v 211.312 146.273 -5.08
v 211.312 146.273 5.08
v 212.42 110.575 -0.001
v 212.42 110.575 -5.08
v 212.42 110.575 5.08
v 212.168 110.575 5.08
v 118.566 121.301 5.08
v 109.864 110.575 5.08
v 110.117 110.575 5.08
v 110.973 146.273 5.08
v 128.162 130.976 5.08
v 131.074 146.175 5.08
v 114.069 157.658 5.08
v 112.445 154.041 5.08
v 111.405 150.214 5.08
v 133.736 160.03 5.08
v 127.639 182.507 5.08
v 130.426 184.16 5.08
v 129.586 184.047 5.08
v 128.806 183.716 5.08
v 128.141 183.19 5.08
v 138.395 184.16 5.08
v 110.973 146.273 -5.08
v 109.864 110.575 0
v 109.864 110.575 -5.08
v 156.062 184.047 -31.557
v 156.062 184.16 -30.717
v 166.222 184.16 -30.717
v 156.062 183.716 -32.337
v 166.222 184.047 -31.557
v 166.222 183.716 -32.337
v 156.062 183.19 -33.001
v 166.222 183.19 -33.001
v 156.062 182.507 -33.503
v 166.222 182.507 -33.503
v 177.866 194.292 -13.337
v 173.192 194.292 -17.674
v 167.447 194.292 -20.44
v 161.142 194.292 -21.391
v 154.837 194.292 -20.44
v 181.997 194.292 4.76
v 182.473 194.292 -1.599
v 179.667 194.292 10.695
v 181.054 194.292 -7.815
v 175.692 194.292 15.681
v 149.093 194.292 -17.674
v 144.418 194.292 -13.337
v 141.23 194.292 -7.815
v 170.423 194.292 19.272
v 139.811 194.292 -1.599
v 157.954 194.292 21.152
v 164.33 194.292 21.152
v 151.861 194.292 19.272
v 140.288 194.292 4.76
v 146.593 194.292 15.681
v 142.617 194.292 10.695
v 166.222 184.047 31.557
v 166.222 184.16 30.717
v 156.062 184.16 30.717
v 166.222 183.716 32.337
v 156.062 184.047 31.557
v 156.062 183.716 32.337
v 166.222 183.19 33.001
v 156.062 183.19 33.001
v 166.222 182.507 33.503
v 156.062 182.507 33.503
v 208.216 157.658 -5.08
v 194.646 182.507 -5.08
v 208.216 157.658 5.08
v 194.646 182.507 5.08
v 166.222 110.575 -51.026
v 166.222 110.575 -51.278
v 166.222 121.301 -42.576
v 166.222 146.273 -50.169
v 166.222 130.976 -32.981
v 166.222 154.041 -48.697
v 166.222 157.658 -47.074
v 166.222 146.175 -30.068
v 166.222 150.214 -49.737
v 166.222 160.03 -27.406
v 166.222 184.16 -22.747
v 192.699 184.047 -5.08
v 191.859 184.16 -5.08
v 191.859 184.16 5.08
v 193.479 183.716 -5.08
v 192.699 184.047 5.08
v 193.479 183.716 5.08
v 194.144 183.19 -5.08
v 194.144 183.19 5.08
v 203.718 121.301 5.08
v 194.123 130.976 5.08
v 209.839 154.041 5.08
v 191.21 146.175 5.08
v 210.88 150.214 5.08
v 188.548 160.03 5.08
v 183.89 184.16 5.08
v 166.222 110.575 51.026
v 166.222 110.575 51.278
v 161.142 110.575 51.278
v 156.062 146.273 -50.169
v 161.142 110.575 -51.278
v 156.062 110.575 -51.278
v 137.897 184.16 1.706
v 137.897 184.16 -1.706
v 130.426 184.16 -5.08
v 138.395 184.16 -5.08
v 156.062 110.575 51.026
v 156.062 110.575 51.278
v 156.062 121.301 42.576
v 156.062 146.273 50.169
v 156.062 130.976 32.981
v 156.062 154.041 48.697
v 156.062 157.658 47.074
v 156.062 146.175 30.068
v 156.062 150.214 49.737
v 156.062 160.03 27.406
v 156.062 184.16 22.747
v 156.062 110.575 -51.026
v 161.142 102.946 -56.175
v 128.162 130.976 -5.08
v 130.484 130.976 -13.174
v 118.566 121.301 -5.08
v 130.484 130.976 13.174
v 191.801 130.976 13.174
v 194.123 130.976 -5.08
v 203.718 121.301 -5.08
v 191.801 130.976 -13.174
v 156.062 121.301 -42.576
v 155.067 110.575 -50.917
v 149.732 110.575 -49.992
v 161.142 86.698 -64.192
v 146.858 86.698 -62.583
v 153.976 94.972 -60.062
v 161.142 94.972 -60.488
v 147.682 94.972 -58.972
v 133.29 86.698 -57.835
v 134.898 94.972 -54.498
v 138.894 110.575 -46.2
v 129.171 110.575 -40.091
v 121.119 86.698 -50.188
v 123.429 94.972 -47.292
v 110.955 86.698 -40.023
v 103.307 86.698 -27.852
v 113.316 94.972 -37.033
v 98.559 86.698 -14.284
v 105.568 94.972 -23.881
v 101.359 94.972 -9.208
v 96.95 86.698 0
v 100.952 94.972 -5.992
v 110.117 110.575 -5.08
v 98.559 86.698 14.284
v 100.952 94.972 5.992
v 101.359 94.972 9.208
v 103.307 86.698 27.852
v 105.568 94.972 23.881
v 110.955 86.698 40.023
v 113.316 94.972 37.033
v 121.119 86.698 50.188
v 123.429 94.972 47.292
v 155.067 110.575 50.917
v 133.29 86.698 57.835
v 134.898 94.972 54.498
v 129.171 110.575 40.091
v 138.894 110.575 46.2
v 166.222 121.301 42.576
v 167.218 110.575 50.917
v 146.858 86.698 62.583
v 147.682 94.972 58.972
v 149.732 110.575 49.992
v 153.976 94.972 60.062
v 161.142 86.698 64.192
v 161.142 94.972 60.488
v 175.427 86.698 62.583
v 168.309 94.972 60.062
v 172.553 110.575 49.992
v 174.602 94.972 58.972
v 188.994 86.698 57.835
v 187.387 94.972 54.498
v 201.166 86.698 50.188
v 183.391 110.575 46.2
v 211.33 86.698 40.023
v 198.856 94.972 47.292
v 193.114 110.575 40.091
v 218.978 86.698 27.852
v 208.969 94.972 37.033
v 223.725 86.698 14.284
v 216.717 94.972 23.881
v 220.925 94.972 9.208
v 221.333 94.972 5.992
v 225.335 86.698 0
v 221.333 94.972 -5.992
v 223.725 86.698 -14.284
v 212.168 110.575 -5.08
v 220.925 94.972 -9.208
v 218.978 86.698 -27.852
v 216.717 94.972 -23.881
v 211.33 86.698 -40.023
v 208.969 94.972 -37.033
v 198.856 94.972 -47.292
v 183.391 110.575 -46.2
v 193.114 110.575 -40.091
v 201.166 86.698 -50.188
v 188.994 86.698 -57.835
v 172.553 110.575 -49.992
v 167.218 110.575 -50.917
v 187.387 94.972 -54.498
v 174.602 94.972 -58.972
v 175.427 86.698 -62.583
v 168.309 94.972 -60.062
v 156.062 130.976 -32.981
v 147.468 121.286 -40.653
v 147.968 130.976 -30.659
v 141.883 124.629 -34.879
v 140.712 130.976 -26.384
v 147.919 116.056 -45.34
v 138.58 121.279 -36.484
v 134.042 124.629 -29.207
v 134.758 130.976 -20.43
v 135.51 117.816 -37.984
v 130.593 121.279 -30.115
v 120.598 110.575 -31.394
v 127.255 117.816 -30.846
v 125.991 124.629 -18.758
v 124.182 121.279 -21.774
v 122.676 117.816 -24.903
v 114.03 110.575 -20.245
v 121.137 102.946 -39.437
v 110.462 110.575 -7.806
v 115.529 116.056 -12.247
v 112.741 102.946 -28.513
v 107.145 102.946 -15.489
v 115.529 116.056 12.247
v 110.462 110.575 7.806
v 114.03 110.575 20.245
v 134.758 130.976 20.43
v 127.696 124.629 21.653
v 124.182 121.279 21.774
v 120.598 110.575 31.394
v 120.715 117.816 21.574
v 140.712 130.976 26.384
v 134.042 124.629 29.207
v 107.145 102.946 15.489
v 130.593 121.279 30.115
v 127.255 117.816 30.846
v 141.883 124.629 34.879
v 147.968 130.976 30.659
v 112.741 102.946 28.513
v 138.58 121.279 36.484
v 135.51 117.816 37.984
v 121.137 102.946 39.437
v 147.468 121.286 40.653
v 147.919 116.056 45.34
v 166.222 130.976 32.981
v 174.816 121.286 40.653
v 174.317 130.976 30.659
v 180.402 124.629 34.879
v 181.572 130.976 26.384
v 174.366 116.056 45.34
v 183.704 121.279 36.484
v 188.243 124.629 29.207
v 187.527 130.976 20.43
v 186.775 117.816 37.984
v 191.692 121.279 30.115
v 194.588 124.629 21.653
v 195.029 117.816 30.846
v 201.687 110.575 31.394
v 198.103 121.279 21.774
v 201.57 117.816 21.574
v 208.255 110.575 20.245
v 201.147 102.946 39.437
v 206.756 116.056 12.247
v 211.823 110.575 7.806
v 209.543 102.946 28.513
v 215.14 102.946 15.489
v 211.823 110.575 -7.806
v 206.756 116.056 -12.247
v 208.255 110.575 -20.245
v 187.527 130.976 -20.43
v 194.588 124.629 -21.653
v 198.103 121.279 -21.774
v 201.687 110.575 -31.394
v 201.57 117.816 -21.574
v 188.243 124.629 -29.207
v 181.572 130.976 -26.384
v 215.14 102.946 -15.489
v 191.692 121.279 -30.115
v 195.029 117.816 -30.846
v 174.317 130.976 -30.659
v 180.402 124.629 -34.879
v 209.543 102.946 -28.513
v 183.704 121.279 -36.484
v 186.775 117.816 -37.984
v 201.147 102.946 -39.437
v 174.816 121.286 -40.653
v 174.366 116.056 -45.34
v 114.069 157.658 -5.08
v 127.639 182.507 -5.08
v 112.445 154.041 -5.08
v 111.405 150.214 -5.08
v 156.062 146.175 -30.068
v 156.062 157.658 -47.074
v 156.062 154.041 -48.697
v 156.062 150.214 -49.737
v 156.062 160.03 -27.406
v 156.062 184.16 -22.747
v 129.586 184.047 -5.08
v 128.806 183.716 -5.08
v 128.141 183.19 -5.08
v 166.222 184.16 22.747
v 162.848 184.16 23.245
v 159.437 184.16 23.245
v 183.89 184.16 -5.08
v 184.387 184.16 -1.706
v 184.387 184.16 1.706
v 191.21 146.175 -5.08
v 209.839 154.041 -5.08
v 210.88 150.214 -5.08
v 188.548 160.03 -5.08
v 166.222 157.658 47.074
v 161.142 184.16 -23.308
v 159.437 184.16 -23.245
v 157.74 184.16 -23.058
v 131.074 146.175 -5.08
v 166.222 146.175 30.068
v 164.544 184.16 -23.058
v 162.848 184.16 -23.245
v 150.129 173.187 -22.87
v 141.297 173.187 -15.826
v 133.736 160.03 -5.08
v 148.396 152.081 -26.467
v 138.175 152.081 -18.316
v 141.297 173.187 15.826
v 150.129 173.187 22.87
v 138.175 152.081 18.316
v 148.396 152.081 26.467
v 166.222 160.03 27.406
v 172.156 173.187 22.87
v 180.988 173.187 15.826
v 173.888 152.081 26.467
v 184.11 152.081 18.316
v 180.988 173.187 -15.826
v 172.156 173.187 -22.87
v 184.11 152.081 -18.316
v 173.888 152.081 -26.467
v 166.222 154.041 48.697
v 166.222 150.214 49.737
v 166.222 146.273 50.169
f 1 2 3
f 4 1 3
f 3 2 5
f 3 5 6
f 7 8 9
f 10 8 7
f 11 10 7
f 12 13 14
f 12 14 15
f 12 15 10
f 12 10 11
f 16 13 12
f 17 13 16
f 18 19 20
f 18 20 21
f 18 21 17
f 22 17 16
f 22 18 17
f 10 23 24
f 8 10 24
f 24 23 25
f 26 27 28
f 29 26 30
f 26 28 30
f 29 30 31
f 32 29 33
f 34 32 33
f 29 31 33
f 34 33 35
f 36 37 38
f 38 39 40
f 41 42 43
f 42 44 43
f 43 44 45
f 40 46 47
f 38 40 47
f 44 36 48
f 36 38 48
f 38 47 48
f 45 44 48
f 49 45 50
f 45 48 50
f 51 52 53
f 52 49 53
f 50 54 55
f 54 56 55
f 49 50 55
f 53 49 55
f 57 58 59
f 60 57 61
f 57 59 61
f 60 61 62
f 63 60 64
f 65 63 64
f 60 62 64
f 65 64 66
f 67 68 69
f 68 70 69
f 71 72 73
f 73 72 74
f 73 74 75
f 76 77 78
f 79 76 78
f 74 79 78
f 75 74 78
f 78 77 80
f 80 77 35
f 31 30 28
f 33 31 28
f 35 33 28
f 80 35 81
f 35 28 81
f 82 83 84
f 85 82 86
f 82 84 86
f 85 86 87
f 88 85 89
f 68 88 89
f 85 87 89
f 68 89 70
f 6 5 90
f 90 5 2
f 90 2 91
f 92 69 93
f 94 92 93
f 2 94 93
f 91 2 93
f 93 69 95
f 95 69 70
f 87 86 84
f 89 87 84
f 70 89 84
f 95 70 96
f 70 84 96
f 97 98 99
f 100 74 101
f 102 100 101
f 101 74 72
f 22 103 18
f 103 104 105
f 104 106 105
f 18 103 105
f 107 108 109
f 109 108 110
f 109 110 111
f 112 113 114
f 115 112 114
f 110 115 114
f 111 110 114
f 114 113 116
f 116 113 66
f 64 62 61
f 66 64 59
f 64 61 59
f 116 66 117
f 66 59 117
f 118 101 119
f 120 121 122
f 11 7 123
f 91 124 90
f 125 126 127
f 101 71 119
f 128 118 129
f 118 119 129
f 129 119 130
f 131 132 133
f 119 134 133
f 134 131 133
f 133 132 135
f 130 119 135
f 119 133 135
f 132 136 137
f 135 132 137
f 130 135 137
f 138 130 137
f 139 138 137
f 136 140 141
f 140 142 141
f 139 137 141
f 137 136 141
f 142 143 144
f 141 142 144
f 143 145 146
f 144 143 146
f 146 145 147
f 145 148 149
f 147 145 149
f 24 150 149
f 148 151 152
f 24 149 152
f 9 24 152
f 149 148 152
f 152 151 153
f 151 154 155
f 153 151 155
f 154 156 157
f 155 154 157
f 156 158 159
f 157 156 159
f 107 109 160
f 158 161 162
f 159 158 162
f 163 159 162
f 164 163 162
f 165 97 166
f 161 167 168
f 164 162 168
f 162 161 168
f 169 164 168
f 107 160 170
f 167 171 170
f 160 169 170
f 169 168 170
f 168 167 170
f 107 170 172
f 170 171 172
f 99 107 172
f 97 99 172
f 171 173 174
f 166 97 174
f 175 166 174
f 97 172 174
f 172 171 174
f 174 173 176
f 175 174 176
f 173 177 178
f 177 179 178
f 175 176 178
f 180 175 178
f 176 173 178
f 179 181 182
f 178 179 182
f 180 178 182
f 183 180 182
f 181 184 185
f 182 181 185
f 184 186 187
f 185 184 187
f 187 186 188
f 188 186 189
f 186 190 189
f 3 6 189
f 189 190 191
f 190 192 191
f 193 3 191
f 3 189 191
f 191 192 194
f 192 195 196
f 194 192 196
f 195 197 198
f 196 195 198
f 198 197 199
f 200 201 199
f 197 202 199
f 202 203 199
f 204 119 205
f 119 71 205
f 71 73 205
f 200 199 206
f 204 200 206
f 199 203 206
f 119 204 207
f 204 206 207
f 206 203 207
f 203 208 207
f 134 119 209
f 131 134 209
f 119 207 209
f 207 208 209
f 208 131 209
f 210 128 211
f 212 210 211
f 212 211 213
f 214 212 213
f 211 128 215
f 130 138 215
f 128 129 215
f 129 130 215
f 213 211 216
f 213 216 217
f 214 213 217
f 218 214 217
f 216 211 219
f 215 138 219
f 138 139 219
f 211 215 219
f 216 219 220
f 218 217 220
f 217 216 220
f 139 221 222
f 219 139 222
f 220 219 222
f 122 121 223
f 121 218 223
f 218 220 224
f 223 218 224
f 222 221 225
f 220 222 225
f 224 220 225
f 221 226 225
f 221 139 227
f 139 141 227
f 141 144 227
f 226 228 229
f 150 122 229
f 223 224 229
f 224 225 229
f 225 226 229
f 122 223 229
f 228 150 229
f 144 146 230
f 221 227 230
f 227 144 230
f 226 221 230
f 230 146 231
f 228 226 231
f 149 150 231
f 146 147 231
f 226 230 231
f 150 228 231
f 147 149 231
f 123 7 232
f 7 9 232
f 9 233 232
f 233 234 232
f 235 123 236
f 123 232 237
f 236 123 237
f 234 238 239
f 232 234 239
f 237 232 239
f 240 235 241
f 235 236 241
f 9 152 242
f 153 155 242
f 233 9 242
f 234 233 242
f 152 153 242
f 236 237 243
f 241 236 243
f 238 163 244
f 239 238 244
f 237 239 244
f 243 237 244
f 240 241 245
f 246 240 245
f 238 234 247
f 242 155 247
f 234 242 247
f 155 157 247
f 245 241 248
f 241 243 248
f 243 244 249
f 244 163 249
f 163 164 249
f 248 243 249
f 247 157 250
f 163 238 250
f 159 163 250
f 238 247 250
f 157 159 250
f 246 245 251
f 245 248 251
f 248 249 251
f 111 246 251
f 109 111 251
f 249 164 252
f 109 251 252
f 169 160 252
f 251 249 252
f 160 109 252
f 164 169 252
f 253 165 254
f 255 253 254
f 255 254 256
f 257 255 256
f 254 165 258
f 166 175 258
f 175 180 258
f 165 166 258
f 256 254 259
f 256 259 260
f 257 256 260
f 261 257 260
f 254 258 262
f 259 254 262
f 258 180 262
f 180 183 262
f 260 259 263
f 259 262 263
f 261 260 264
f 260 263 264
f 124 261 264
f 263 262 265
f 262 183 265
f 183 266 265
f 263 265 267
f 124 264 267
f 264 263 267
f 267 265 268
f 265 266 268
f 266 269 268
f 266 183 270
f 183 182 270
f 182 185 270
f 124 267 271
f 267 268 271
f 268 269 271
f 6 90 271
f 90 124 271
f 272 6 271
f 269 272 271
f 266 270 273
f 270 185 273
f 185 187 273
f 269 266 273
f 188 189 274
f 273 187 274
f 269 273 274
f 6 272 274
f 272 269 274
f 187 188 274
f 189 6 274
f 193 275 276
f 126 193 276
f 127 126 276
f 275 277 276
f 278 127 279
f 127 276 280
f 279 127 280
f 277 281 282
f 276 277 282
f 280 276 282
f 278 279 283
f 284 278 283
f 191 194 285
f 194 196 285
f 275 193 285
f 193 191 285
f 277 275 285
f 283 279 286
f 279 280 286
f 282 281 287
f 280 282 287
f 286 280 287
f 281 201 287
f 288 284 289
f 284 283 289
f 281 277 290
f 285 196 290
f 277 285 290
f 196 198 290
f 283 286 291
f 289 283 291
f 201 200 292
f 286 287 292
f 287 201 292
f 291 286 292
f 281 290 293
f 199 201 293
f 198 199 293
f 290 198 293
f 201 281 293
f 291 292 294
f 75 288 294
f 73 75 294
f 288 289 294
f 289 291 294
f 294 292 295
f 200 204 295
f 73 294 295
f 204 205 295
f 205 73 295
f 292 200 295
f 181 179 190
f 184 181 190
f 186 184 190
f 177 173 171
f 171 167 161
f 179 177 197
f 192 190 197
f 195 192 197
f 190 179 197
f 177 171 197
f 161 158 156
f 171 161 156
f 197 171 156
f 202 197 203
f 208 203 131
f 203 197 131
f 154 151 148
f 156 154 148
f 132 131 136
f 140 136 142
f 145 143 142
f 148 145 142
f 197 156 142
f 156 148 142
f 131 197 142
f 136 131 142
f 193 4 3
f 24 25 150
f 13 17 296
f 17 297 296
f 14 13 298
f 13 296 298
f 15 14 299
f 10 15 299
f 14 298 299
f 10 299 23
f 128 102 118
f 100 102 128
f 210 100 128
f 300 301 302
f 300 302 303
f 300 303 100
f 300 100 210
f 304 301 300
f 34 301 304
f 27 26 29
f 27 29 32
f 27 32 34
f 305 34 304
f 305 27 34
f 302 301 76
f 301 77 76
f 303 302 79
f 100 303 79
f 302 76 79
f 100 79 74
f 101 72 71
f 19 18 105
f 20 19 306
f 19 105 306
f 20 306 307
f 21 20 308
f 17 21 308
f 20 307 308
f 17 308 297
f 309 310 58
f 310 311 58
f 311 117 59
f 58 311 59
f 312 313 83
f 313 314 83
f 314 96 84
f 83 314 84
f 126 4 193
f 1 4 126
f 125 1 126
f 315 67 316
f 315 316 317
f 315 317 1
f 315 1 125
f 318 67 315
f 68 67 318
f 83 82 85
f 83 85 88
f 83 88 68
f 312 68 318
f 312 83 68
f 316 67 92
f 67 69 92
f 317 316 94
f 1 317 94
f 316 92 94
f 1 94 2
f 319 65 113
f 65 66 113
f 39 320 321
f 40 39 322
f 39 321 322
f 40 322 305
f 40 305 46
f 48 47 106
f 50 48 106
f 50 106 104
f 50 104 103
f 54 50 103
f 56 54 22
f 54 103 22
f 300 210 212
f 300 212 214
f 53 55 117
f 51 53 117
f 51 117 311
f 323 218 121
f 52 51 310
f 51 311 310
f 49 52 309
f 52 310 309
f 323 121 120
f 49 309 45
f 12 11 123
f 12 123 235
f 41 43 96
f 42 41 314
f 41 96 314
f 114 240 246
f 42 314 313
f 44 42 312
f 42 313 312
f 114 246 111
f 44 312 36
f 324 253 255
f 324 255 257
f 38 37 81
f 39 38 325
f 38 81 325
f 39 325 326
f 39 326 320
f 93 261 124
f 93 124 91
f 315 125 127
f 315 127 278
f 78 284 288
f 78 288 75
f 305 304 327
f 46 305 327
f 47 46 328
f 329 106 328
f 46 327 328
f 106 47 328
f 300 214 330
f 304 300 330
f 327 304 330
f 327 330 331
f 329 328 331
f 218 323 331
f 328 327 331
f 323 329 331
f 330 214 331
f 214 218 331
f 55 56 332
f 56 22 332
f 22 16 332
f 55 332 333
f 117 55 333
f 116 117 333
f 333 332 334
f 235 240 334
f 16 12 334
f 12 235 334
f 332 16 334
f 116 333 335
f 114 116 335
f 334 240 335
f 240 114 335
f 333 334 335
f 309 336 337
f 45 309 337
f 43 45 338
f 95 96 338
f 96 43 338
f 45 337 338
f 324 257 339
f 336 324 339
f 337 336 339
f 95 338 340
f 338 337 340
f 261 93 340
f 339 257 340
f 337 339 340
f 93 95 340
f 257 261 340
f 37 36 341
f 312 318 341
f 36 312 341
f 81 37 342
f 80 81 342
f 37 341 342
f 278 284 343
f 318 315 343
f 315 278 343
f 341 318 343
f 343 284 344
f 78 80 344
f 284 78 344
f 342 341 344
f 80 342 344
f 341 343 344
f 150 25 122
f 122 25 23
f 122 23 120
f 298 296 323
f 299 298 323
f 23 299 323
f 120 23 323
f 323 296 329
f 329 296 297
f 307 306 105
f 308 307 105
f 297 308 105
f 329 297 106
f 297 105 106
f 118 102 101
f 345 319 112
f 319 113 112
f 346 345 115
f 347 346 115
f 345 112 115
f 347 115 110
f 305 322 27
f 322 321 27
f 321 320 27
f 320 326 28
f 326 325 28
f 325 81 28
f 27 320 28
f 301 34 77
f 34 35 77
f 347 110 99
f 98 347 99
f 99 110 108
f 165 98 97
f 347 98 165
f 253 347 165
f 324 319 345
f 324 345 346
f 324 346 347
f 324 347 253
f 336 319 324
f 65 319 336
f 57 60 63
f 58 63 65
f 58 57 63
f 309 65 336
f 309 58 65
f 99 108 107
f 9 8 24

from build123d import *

# Parameters (mm, degrees)
EXTRUDE7_DEPTH    = 5.08
CIRPATTERN1_COUNT = 4


with BuildPart() as part:
    # Sketch9 → Revolve3 (revolve)
    with BuildSketch(Plane.XY):
        with BuildLine():
            Line((182.533079755, 194.292434626), (161.142350377, 194.292434626))
            Line((161.142350377, 194.292434626), (161.142350377, 86.698034626))
            Line((161.142350377, 86.698034626), (225.334809451, 86.698034626))
            ThreePointArc((225.334809451, 86.698034626), (212.420274366, 110.575127951), (194.511888207, 130.975875666))
            Line((194.511888207, 130.975875666), (182.533079755, 194.292434626))
        make_face()
    revolve(axis=Axis((161.142350377, 86.698034626, 0), (0, 1, 0)))

    # Sketch10 → Extrude7 (add, symmetric)
    with BuildSketch(Plane.XY):
        with BuildLine():
            Line((161.142350377, 110.575127951), (161.142350377, 184.160379168))
            Line((161.142350377, 184.160379168), (191.859109399, 184.160379168))
            ThreePointArc((191.859109399, 184.160379168), (193.479127486, 183.715977344), (194.645640696, 182.507176898))
            Line((194.645640696, 182.507176898), (208.216170429, 157.658469957))
            ThreePointArc((208.216170429, 157.658469957), (210.434241625, 152.147730999), (211.311680607, 146.272513171))
            Line((211.311680607, 146.272513171), (212.420274366, 110.575127951))
            Line((212.420274366, 110.575127951), (161.142350377, 110.575127951))
        make_face()
    extrude7 = extrude(amount=EXTRUDE7_DEPTH, both=True)

    # CirPattern1: Extrude7 ×4 about axis
    cirpattern1_axis = Axis((161.142350377, 130.975875666, 0), (0, 1, 0))
    for i in range(1, CIRPATTERN1_COUNT):
        add(extrude7.rotate(cirpattern1_axis, i * 360 / CIRPATTERN1_COUNT))


solid = part.part
